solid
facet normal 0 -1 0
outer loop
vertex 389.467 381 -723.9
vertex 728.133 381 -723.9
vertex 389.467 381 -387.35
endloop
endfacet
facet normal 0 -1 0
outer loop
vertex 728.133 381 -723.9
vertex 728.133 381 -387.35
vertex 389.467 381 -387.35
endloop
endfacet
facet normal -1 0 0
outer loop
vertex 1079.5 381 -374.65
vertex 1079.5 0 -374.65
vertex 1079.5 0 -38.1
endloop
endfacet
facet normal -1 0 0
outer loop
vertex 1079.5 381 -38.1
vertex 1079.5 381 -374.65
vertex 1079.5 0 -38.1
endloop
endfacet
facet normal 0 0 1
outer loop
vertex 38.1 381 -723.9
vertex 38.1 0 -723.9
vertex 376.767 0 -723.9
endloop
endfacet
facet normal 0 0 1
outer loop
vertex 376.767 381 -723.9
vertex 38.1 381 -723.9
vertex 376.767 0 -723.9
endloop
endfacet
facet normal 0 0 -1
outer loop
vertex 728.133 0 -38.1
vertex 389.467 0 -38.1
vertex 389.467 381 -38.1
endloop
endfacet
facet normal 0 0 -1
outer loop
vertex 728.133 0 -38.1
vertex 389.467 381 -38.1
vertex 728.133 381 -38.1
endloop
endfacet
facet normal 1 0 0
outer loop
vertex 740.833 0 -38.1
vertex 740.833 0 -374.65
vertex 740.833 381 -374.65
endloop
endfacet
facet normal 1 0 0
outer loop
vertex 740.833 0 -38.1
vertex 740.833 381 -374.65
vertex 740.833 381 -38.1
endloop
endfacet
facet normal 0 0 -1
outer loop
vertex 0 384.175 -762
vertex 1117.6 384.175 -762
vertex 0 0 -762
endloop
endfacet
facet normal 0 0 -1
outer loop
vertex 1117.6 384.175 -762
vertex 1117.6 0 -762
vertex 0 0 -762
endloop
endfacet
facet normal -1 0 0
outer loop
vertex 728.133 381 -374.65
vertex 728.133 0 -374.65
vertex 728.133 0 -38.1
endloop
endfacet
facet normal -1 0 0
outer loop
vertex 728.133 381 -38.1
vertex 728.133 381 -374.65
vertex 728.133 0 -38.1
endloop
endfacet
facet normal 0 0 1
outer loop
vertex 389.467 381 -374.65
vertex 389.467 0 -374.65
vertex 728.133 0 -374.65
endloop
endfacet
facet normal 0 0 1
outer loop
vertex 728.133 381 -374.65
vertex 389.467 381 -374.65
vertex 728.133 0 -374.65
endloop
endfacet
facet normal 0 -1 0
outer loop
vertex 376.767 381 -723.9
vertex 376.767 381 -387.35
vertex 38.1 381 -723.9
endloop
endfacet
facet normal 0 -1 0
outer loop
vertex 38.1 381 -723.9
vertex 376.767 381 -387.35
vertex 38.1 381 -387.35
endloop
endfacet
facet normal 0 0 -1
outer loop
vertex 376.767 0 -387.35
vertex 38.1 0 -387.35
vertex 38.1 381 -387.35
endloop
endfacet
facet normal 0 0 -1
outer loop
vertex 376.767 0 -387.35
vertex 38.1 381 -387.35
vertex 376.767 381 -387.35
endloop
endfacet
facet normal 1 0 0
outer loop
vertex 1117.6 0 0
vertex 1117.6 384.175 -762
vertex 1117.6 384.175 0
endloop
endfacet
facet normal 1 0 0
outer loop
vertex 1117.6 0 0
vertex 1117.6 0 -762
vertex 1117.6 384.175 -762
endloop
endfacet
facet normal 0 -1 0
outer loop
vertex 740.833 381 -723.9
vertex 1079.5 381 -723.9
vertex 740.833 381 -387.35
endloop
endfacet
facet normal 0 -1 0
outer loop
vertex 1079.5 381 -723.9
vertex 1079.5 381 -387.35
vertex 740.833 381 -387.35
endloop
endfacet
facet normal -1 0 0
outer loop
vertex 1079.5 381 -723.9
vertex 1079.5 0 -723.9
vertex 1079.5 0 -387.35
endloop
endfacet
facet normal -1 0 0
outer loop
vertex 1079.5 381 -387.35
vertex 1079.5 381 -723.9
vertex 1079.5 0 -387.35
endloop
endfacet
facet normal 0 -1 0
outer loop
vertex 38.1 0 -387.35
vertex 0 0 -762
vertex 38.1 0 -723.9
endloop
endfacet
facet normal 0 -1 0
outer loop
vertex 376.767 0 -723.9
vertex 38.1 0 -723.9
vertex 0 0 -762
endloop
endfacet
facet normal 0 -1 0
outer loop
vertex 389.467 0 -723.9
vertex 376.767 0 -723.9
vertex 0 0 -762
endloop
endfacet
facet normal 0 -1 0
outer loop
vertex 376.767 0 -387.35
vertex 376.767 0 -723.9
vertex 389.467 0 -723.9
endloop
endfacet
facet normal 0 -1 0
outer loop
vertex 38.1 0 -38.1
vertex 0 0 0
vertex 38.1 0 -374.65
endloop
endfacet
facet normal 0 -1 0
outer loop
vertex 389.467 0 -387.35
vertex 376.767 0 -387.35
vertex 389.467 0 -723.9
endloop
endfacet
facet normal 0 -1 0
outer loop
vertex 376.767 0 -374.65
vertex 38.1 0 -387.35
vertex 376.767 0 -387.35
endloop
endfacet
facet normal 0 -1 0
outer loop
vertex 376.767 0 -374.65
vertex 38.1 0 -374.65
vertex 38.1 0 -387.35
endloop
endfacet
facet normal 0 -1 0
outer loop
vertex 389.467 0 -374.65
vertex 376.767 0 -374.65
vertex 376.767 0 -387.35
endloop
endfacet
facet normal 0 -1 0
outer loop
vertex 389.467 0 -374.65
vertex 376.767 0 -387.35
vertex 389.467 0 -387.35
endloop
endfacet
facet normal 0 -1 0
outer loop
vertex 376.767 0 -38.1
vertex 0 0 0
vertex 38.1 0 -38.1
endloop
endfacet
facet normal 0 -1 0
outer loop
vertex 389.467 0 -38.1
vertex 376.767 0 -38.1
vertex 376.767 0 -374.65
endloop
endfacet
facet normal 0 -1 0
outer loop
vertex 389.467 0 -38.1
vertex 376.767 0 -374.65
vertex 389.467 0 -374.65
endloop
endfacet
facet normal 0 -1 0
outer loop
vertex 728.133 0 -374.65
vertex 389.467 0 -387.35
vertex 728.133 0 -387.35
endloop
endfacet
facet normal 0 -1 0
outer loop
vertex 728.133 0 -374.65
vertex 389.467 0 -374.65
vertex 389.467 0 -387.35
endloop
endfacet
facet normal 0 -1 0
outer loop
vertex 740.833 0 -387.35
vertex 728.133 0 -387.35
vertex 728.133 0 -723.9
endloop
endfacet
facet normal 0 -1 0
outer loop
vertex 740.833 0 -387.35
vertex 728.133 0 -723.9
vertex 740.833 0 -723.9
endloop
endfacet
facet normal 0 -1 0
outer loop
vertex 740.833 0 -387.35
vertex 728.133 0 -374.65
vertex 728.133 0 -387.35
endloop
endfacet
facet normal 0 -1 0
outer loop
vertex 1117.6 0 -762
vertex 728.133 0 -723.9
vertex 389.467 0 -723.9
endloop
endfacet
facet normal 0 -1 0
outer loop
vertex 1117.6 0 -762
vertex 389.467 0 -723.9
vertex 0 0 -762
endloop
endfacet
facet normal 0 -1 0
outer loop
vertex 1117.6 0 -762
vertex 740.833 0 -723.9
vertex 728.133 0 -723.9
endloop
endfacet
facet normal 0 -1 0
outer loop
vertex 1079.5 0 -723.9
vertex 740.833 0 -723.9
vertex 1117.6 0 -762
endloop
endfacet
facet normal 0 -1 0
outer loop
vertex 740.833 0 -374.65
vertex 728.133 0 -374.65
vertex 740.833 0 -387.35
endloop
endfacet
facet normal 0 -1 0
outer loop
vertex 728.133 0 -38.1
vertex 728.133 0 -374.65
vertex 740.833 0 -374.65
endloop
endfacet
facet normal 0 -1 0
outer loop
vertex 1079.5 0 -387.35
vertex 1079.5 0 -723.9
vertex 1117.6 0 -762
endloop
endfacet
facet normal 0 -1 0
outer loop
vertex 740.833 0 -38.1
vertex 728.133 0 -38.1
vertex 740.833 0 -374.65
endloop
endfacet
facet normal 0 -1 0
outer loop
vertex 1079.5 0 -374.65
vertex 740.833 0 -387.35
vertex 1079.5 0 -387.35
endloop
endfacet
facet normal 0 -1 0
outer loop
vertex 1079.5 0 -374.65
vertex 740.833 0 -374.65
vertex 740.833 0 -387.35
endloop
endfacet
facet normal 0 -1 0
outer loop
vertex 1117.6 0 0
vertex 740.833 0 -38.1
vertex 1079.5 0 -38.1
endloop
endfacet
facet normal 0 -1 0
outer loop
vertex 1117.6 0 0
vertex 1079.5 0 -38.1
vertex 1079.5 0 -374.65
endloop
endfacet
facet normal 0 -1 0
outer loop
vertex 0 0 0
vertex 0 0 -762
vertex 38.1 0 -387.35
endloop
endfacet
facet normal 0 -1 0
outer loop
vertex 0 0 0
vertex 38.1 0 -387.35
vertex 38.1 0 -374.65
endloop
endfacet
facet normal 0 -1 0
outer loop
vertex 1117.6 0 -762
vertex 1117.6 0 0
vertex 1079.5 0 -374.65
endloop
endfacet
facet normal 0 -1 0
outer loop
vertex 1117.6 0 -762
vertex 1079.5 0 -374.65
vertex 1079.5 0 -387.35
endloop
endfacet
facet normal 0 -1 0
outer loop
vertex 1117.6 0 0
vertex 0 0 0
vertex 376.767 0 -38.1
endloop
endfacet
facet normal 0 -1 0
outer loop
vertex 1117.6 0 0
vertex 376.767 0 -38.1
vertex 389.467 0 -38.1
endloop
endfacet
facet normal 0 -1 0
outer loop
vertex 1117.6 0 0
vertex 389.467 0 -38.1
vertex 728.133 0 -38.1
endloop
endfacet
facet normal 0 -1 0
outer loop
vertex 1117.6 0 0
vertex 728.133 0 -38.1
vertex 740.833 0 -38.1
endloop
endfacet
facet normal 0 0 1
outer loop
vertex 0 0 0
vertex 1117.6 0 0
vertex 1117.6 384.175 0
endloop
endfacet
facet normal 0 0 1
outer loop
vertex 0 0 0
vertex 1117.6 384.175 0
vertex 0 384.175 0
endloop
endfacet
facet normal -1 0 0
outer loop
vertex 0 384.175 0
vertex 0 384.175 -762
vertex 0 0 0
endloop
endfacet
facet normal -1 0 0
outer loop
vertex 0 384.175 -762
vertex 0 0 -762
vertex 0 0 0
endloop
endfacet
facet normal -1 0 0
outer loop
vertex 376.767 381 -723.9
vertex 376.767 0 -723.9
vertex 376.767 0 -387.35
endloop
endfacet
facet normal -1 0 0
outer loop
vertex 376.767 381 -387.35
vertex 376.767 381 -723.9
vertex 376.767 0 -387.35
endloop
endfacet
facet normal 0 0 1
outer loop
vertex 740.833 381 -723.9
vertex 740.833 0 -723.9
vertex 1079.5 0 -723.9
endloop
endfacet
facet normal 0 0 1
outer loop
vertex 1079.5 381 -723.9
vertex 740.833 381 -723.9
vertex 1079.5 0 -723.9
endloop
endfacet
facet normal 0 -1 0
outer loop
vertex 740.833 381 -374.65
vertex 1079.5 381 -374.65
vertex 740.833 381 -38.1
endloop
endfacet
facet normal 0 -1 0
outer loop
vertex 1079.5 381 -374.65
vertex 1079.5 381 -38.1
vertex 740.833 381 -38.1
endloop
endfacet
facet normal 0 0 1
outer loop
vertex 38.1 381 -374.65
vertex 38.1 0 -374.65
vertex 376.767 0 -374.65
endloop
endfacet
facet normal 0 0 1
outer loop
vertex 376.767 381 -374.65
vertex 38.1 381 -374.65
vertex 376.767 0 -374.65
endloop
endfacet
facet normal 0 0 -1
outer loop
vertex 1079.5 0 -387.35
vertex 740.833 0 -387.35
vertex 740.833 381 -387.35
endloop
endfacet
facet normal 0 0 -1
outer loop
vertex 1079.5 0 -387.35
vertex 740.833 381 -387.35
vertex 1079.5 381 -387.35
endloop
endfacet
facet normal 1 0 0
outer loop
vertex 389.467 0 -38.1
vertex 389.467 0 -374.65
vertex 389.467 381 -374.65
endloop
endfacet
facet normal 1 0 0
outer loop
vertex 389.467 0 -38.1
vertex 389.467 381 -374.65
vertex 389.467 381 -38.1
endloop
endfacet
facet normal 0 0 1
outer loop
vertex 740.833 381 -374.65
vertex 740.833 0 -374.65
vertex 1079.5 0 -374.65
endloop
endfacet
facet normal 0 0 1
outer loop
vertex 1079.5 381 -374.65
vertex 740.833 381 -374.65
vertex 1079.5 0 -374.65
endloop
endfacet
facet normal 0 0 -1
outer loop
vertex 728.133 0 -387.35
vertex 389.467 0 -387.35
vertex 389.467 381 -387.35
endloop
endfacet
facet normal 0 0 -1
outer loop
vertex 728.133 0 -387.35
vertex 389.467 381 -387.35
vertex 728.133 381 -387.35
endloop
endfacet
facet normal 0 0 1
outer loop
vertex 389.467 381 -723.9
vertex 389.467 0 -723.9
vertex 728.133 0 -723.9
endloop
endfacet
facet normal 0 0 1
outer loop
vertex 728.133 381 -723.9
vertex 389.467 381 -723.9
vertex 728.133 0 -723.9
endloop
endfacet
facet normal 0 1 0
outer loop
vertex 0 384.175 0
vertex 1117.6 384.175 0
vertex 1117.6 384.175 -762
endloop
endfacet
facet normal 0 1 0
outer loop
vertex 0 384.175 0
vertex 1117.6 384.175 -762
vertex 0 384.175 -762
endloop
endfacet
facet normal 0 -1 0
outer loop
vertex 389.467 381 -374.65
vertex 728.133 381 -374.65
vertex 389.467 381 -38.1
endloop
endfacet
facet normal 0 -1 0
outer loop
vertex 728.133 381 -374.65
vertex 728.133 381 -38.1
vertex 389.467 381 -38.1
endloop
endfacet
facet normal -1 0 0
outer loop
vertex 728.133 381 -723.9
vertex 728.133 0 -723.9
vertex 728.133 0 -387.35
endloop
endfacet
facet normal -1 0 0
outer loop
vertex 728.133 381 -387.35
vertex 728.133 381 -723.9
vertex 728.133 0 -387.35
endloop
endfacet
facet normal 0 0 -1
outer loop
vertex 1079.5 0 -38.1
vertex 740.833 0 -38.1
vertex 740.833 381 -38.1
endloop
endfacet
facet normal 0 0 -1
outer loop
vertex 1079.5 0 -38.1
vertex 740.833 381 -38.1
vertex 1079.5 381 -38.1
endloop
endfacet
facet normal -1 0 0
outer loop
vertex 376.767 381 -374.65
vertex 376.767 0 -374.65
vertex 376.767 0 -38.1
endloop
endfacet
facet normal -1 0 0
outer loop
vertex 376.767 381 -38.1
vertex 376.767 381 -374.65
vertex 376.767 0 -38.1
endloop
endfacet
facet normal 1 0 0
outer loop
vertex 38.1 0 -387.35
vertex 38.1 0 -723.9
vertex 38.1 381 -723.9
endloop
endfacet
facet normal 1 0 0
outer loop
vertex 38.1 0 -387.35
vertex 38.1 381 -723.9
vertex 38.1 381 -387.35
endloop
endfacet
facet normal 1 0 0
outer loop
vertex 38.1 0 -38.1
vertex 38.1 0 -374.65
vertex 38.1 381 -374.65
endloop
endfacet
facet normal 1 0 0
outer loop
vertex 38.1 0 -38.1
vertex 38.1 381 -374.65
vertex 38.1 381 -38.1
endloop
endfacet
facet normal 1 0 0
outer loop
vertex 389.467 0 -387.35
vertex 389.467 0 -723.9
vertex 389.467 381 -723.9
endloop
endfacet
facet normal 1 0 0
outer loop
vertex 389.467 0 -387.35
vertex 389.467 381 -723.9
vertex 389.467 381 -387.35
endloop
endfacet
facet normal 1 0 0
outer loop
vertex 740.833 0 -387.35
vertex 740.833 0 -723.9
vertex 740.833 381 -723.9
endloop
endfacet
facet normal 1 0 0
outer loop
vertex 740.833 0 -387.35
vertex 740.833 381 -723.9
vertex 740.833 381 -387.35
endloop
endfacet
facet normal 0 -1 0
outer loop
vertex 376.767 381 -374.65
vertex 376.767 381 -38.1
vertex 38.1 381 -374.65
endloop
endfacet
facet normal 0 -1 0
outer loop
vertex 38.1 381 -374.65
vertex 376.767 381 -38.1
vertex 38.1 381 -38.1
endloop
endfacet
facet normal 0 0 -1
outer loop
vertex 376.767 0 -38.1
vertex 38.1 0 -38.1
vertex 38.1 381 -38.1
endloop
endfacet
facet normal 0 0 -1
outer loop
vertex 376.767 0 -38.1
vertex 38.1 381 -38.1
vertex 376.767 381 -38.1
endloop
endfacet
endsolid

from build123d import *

# Parameters (mm, degrees)
F0_W     = 1117.6
F0_H     = 762
F0_W_2   = 338.666667
F0_H_2   = 336.55
F0_W_3   = 338.666666
F1_DEPTH = 381
F2_W     = 1117.6
F2_H     = 762
F3_DEPTH = 3.175


with BuildPart() as f1:
    # F0 (on Front) → F1 (new body)
    with BuildSketch(Plane.XZ):
        with Locations((558.8, -381)):
            Rectangle(F0_W, F0_H)
        with Locations((207.433334, -555.625)):
            Rectangle(F0_W_2, F0_H_2, mode=Mode.SUBTRACT)
        with Locations((558.8, -555.625)):
            Rectangle(F0_W_3, F0_H_2, mode=Mode.SUBTRACT)
        with Locations((910.166667, -555.625)):
            Rectangle(F0_W_2, F0_H_2, mode=Mode.SUBTRACT)
        with Locations((207.433334, -206.375)):
            Rectangle(F0_W_2, F0_H_2, mode=Mode.SUBTRACT)
        with Locations((558.8, -206.375)):
            Rectangle(F0_W_3, F0_H_2, mode=Mode.SUBTRACT)
        with Locations((910.166667, -206.375)):
            Rectangle(F0_W_2, F0_H_2, mode=Mode.SUBTRACT)
    extrude(amount=-F1_DEPTH)

    # F2 (on face) → F3 (join)
    with BuildSketch(Plane(origin=(0, 381, 0), x_dir=(-1, 0, 0), z_dir=(0, 1, 0))):
        with Locations((-558.8, -381)):
            Rectangle(F2_W, F2_H)
    extrude(amount=F3_DEPTH)


solid = f1.part
